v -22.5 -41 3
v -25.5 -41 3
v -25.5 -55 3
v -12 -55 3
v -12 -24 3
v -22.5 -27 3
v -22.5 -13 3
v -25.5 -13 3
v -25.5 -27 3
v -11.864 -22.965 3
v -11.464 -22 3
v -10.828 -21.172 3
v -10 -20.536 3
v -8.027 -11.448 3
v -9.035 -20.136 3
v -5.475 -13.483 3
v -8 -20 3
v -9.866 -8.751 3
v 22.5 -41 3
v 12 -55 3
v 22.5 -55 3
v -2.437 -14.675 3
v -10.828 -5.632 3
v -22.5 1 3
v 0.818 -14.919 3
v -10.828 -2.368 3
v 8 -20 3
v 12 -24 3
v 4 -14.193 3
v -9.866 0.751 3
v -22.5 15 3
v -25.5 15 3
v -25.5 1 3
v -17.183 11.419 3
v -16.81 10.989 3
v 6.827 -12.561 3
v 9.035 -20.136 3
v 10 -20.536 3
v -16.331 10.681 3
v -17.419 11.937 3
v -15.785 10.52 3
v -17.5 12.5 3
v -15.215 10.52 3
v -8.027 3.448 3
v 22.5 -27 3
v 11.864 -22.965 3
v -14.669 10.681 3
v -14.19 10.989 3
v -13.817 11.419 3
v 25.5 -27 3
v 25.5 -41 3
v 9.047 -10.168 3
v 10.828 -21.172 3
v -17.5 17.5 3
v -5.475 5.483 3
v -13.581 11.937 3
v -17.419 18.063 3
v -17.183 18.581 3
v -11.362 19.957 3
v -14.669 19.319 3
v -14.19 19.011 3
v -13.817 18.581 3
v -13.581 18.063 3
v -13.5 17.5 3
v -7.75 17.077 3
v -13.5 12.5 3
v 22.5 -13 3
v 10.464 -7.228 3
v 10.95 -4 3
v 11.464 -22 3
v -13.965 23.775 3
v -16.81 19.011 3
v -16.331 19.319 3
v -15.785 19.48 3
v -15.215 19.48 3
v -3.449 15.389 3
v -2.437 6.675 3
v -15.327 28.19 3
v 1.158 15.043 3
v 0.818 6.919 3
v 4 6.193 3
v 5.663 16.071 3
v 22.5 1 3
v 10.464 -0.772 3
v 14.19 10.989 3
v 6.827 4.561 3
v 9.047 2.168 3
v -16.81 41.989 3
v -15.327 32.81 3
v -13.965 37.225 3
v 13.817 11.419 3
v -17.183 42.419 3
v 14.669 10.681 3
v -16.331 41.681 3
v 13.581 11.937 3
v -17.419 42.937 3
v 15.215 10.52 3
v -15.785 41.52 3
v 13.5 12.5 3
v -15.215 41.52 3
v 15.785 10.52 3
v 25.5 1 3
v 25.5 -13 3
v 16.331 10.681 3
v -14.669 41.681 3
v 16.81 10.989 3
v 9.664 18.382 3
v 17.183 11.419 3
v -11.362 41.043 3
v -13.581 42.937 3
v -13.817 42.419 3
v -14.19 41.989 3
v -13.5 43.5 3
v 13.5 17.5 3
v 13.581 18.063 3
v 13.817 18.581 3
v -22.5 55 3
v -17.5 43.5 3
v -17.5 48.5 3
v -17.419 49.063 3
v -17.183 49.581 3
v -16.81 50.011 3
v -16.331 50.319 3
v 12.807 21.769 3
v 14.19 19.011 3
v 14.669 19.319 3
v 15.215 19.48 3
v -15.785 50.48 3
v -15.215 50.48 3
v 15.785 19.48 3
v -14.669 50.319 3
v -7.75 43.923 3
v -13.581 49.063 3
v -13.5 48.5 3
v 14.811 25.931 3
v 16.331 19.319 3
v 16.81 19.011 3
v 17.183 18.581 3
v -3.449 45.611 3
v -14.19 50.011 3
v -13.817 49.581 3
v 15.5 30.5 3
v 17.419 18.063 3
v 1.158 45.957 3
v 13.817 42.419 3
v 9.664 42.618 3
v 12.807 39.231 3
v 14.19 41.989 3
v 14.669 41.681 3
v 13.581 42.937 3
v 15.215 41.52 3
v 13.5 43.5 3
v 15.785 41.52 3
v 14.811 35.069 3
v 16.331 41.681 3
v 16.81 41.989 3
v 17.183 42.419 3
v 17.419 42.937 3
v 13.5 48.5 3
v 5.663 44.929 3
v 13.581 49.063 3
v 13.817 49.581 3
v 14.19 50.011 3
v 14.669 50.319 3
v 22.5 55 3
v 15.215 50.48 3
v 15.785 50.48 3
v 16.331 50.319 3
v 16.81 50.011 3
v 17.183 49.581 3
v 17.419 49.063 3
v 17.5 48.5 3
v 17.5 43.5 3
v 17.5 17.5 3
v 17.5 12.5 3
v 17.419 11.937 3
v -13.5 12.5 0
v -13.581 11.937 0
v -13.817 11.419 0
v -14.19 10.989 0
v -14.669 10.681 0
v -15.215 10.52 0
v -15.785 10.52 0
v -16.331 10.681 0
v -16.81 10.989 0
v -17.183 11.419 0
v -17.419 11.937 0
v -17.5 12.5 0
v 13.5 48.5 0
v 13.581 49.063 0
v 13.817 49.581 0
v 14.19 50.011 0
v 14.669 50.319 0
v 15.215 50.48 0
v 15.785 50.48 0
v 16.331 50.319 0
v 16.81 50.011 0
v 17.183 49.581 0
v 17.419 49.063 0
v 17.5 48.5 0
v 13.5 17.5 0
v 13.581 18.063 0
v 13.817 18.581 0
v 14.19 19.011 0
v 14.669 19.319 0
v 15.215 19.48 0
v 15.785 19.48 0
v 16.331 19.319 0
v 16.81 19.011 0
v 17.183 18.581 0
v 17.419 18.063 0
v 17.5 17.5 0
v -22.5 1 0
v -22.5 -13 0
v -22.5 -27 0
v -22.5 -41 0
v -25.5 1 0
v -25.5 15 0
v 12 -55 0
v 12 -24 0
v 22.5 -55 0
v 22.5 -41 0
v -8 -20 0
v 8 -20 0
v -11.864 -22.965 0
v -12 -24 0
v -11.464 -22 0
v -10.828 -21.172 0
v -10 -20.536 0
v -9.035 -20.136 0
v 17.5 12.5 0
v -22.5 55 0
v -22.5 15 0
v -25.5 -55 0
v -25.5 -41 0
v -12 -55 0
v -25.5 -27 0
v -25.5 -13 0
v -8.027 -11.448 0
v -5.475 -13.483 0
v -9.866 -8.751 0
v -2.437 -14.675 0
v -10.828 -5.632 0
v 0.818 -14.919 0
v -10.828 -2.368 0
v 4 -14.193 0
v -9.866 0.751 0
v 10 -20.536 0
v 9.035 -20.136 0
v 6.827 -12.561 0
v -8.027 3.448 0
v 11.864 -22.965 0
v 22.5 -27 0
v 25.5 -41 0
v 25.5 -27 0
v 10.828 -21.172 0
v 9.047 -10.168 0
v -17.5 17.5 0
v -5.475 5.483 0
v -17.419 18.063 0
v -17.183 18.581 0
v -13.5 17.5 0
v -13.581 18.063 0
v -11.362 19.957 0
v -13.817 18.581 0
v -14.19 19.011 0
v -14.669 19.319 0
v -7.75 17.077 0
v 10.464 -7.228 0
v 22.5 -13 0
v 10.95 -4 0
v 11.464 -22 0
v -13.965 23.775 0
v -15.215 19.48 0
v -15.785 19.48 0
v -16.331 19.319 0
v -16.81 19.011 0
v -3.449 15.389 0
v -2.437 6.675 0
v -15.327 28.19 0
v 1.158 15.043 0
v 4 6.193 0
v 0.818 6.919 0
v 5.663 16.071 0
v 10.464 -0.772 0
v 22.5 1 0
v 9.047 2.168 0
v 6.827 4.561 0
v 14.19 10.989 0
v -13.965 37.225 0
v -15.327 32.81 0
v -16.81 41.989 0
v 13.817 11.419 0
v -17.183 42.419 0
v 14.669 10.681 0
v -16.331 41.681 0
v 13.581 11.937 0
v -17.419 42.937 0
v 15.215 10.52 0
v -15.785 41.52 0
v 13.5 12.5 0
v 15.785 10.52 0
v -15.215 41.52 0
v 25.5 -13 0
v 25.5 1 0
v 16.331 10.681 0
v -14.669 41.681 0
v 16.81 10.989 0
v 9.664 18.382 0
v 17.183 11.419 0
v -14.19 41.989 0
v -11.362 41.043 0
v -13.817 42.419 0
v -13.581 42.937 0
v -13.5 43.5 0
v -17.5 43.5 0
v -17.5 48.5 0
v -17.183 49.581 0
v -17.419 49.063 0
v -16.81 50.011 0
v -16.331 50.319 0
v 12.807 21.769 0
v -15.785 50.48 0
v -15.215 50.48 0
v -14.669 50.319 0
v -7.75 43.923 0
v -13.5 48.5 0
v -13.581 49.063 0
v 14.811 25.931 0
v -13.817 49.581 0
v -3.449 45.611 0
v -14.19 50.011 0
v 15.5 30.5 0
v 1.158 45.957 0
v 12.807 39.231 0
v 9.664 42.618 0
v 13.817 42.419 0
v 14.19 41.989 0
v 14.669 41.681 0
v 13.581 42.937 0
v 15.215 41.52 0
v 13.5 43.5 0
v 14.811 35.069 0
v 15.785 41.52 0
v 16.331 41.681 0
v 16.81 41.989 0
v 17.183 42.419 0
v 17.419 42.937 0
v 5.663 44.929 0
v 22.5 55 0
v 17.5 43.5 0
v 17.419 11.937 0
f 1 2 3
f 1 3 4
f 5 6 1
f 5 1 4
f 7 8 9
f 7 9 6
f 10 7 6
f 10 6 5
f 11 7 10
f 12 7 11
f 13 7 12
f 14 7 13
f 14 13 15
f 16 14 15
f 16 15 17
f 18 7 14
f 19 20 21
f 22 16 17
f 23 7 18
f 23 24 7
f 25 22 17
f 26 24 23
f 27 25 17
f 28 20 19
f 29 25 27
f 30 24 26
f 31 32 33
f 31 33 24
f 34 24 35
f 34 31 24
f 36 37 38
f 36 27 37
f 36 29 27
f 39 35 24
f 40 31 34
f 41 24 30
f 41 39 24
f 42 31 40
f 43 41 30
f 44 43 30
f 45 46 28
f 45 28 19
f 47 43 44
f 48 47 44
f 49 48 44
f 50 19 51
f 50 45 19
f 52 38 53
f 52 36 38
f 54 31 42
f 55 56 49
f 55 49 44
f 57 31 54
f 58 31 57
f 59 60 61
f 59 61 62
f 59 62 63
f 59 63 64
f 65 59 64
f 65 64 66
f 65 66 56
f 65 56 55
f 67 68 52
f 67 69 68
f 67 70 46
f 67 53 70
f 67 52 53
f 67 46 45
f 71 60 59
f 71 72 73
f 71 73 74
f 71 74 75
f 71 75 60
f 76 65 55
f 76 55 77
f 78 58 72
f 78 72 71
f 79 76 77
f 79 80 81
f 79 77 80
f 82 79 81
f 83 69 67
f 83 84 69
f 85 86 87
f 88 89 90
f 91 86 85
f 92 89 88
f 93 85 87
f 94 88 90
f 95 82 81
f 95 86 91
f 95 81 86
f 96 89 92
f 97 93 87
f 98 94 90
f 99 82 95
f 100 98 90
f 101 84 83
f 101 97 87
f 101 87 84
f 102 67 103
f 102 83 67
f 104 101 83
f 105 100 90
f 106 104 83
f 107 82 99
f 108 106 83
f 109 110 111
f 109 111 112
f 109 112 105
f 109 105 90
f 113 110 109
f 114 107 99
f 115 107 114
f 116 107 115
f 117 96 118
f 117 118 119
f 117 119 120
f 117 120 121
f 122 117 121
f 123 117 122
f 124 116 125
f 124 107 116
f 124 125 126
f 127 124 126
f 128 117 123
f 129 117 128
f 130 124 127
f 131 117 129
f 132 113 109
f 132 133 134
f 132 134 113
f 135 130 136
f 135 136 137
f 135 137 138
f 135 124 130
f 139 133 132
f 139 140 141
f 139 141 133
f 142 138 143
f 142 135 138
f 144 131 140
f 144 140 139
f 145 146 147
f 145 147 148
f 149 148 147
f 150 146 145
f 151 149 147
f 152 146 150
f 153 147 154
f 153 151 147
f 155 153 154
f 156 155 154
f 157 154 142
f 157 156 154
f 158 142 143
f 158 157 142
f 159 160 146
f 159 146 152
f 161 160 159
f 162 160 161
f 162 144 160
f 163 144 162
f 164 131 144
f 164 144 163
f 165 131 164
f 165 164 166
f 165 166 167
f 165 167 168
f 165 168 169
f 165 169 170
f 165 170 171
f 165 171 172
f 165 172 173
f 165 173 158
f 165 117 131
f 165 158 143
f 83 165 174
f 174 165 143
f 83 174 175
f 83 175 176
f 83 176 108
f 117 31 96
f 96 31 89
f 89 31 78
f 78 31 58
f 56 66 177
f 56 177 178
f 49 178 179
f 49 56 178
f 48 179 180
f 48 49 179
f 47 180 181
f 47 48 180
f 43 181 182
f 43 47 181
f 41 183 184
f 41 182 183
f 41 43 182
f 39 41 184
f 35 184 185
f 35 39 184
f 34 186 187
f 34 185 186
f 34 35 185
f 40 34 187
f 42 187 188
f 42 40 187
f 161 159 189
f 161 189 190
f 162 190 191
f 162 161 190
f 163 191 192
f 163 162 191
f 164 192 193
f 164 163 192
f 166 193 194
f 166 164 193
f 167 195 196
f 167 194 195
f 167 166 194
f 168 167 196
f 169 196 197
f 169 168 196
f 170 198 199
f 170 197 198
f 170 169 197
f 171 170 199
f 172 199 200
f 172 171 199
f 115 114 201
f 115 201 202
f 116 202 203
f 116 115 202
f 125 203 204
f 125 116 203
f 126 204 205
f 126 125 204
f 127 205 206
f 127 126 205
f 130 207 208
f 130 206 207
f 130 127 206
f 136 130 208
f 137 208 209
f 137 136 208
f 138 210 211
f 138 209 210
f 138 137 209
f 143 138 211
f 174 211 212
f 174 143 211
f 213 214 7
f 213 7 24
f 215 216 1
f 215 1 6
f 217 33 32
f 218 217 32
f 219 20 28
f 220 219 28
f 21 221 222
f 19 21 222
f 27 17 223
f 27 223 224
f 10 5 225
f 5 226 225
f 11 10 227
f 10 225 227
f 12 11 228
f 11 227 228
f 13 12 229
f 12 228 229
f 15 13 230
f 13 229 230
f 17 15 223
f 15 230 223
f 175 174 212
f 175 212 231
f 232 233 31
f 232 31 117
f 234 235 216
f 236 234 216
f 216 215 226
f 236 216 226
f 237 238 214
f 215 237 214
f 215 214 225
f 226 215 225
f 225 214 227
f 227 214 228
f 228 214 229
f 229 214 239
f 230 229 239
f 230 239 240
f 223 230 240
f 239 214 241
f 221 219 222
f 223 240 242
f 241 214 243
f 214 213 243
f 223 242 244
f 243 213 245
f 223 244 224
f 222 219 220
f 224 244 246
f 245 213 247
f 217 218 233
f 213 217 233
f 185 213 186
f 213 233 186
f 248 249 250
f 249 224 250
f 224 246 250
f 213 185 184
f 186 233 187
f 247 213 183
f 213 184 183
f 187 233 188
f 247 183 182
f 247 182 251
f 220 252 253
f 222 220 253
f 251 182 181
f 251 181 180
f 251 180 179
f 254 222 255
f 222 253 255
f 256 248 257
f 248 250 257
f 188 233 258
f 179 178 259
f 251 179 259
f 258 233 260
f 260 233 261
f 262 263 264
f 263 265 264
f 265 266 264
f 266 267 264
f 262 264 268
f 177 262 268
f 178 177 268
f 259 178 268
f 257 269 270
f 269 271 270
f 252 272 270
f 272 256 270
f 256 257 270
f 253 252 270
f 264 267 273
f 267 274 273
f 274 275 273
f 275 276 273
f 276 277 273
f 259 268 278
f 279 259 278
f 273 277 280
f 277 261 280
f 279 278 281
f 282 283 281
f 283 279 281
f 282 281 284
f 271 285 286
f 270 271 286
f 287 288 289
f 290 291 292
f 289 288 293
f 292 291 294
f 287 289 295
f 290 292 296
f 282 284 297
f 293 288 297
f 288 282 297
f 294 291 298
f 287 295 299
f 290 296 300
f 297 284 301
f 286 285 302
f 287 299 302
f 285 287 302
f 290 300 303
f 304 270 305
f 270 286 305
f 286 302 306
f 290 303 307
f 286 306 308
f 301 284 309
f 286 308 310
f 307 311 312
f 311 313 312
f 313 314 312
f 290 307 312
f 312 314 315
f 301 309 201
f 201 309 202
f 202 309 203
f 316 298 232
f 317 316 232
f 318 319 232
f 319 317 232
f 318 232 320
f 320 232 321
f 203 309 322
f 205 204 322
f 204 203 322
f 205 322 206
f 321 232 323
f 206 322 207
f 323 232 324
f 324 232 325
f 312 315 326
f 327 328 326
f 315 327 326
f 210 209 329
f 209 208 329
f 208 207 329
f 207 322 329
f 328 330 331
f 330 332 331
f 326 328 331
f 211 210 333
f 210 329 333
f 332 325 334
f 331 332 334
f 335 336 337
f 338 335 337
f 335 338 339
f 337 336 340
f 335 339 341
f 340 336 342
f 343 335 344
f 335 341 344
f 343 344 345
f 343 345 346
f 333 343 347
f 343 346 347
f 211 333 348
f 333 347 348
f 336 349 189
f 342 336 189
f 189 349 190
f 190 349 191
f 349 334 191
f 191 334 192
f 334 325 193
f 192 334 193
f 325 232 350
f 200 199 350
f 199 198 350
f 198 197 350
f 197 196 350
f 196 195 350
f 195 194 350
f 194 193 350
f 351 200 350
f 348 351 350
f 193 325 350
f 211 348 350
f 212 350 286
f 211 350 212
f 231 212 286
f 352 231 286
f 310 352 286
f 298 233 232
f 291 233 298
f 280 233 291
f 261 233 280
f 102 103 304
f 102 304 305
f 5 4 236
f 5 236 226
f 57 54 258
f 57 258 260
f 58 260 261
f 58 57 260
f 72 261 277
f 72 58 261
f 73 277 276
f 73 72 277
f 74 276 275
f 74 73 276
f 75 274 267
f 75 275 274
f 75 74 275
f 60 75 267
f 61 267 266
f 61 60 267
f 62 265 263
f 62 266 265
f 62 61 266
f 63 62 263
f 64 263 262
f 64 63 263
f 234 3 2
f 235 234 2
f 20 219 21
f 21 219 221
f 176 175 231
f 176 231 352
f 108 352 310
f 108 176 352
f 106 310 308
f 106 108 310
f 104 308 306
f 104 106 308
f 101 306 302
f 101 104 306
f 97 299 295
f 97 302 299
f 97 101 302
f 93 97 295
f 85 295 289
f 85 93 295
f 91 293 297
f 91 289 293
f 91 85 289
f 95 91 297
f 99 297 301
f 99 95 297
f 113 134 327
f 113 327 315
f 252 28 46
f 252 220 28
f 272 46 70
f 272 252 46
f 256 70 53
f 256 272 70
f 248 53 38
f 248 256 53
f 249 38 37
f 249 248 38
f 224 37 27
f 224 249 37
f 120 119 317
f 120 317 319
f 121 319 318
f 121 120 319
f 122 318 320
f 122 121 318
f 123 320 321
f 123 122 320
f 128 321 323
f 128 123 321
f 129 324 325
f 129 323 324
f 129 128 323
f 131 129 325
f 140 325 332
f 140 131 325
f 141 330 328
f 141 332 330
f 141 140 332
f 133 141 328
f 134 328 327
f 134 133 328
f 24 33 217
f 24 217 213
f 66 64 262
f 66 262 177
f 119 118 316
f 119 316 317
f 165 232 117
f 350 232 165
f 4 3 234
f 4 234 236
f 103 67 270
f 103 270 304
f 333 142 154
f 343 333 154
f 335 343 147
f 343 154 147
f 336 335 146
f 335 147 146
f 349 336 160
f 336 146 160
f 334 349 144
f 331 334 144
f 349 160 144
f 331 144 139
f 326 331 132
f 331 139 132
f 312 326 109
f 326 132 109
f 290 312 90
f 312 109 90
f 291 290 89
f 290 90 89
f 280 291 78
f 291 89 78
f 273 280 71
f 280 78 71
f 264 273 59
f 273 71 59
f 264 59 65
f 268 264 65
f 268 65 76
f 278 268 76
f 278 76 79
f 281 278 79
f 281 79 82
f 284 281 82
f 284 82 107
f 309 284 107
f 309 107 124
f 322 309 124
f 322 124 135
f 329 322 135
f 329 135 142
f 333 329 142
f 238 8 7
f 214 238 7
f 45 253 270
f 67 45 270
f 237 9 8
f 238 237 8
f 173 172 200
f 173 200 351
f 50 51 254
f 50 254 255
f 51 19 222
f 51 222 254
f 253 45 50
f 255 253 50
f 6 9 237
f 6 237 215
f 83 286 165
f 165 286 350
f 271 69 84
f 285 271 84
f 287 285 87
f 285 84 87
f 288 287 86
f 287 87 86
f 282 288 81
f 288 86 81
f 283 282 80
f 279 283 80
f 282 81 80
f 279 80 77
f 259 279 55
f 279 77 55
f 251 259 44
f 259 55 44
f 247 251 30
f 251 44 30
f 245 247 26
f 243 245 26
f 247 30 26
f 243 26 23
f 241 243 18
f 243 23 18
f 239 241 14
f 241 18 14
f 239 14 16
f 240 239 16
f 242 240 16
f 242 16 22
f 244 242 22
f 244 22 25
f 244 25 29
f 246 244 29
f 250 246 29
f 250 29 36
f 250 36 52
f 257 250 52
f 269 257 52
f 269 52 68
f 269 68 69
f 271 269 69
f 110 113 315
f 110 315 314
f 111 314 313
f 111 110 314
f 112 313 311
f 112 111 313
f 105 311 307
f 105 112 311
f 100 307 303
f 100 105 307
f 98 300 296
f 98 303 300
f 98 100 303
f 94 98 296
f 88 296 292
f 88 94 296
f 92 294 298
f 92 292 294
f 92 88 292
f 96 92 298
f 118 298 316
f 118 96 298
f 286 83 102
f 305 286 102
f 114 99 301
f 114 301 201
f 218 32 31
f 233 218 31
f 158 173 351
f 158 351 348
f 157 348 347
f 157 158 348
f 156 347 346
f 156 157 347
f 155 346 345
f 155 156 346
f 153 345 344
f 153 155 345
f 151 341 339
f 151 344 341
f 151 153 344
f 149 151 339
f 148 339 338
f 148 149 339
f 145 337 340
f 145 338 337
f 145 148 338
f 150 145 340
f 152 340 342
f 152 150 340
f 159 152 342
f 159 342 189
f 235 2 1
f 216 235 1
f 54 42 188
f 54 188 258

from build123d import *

# Parameters (mm, degrees)
SKETCH1_W           = 45
SKETCH1_H           = 110
BOSS_EXTRUDE1_DEPTH = 3
SKETCH2_R           = 10.95
SKETCH2_R_2         = 15.5
SKETCH2_W           = 24
SKETCH2_H           = 35
CUT_EXTRUDE1_DEPTH  = 4
FILLET1_R           = 4
SKETCH3_W           = 3
SKETCH3_H           = 14
BOSS_EXTRUDE2_DEPTH = 3


with BuildPart() as part:
    # Sketch1 → Boss-Extrude1 (new body)
    with BuildSketch(Plane.XY):
        Rectangle(SKETCH1_W, SKETCH1_H)
    extrude(amount=BOSS_EXTRUDE1_DEPTH)

    # Sketch2 → Cut-Extrude1 (cut, through all)
    with BuildSketch(Plane.XY.offset(3)):
        with Locations((0, -4)):
            Circle(SKETCH2_R)
        with Locations((0, 30.5)):
            Circle(SKETCH2_R_2)
        with Locations((0, -37.5)):
            Rectangle(SKETCH2_W, SKETCH2_H)
        with BuildLine():
            Line((-17.5, 43.5), (-17.5, 48.5))
            ThreePointArc((-17.5, 48.5), (-15.5, 50.5), (-13.5, 48.5))
            Line((-13.5, 48.5), (-13.5, 43.5))
            ThreePointArc((-13.5, 43.5), (-15.5, 41.5), (-17.5, 43.5))
        make_face()
        with BuildLine():
            Line((-13.5, 17.5), (-13.5, 12.5))
            ThreePointArc((-13.5, 12.5), (-15.5, 10.5), (-17.5, 12.5))
            Line((-17.5, 12.5), (-17.5, 17.5))
            ThreePointArc((-17.5, 17.5), (-15.5, 19.5), (-13.5, 17.5))
        make_face()
        with BuildLine():
            Line((17.5, 17.5), (17.5, 12.5))
            ThreePointArc((17.5, 12.5), (15.5, 10.5), (13.5, 12.5))
            Line((13.5, 12.5), (13.5, 17.5))
            ThreePointArc((13.5, 17.5), (15.5, 19.5), (17.5, 17.5))
        make_face()
        with BuildLine():
            Line((13.5, 43.5), (13.5, 48.5))
            ThreePointArc((13.5, 48.5), (15.5, 50.5), (17.5, 48.5))
            Line((17.5, 48.5), (17.5, 43.5))
            ThreePointArc((17.5, 43.5), (15.5, 41.5), (13.5, 43.5))
        make_face()
    extrude(amount=-CUT_EXTRUDE1_DEPTH, mode=Mode.SUBTRACT)

    # Fillet1
    fillet1_edges = [part.edges().sort_by_distance(p)[0] for p in [
        (12, -20, 1.5),
        (-12, -20, 1.5),
    ]]
    fillet(fillet1_edges, radius=FILLET1_R)

    # Sketch3 → Boss-Extrude2 (add)
    with BuildSketch(Plane.XY.offset(3)):
        with Locations((-24, -20)):
            Rectangle(SKETCH3_W, SKETCH3_H)
        with Locations((-24, 8)):
            Rectangle(SKETCH3_W, SKETCH3_H)
        with Locations((-24, -48)):
            Rectangle(SKETCH3_W, SKETCH3_H)
        with Locations((24, -6)):
            Rectangle(SKETCH3_W, SKETCH3_H)
        with Locations((24, -34)):
            Rectangle(SKETCH3_W, SKETCH3_H)
    extrude(amount=-BOSS_EXTRUDE2_DEPTH)


solid = part.part
